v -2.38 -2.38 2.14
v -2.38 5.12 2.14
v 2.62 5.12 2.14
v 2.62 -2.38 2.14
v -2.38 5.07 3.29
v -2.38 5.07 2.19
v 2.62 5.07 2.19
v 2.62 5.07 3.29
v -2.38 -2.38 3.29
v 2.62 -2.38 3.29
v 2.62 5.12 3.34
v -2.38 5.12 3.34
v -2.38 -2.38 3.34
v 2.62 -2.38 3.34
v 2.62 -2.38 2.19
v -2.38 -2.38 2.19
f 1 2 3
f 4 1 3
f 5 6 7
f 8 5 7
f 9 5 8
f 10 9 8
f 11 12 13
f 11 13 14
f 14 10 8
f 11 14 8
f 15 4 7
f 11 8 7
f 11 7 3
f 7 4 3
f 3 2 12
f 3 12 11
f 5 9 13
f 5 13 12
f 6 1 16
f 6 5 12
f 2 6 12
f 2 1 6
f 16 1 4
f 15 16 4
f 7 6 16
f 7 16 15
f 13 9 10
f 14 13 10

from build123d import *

# Parameters (mm, degrees)
BOX056_W     = 5
BOX056_H     = 7.45
BOX056_DEPTH = 1.1
BOX055_W     = 5
BOX055_H     = 7.5
BOX055_DEPTH = 1.2


with BuildPart() as small_cu_gnd_electrode012:
    # Box056 → Box056 (new body)
    with BuildSketch(Plane.XY.offset(0.05)):
        with Locations((2.5, 3.725)):
            Rectangle(BOX056_W, BOX056_H)
    extrude(amount=BOX056_DEPTH)


with BuildPart() as small_cu_electrode001_long_axis_v:
    # Box055 → Box055 (new body)
    with BuildSketch(Plane.XY):
        with Locations((2.5, 3.75)):
            Rectangle(BOX055_W, BOX055_H)
    extrude(amount=BOX055_DEPTH)

    # Cut008: cut Small Cu GND Electrode012
    add(small_cu_gnd_electrode012.part, mode=Mode.SUBTRACT)


with BuildPart() as small_cu_electrode001_long_axis_v_1:
    # Cut008 placement: moved
    add(small_cu_electrode001_long_axis_v.part.moved(Location((-2.38, -2.38, 2.14))))


solid = small_cu_electrode001_long_axis_v_1.part
